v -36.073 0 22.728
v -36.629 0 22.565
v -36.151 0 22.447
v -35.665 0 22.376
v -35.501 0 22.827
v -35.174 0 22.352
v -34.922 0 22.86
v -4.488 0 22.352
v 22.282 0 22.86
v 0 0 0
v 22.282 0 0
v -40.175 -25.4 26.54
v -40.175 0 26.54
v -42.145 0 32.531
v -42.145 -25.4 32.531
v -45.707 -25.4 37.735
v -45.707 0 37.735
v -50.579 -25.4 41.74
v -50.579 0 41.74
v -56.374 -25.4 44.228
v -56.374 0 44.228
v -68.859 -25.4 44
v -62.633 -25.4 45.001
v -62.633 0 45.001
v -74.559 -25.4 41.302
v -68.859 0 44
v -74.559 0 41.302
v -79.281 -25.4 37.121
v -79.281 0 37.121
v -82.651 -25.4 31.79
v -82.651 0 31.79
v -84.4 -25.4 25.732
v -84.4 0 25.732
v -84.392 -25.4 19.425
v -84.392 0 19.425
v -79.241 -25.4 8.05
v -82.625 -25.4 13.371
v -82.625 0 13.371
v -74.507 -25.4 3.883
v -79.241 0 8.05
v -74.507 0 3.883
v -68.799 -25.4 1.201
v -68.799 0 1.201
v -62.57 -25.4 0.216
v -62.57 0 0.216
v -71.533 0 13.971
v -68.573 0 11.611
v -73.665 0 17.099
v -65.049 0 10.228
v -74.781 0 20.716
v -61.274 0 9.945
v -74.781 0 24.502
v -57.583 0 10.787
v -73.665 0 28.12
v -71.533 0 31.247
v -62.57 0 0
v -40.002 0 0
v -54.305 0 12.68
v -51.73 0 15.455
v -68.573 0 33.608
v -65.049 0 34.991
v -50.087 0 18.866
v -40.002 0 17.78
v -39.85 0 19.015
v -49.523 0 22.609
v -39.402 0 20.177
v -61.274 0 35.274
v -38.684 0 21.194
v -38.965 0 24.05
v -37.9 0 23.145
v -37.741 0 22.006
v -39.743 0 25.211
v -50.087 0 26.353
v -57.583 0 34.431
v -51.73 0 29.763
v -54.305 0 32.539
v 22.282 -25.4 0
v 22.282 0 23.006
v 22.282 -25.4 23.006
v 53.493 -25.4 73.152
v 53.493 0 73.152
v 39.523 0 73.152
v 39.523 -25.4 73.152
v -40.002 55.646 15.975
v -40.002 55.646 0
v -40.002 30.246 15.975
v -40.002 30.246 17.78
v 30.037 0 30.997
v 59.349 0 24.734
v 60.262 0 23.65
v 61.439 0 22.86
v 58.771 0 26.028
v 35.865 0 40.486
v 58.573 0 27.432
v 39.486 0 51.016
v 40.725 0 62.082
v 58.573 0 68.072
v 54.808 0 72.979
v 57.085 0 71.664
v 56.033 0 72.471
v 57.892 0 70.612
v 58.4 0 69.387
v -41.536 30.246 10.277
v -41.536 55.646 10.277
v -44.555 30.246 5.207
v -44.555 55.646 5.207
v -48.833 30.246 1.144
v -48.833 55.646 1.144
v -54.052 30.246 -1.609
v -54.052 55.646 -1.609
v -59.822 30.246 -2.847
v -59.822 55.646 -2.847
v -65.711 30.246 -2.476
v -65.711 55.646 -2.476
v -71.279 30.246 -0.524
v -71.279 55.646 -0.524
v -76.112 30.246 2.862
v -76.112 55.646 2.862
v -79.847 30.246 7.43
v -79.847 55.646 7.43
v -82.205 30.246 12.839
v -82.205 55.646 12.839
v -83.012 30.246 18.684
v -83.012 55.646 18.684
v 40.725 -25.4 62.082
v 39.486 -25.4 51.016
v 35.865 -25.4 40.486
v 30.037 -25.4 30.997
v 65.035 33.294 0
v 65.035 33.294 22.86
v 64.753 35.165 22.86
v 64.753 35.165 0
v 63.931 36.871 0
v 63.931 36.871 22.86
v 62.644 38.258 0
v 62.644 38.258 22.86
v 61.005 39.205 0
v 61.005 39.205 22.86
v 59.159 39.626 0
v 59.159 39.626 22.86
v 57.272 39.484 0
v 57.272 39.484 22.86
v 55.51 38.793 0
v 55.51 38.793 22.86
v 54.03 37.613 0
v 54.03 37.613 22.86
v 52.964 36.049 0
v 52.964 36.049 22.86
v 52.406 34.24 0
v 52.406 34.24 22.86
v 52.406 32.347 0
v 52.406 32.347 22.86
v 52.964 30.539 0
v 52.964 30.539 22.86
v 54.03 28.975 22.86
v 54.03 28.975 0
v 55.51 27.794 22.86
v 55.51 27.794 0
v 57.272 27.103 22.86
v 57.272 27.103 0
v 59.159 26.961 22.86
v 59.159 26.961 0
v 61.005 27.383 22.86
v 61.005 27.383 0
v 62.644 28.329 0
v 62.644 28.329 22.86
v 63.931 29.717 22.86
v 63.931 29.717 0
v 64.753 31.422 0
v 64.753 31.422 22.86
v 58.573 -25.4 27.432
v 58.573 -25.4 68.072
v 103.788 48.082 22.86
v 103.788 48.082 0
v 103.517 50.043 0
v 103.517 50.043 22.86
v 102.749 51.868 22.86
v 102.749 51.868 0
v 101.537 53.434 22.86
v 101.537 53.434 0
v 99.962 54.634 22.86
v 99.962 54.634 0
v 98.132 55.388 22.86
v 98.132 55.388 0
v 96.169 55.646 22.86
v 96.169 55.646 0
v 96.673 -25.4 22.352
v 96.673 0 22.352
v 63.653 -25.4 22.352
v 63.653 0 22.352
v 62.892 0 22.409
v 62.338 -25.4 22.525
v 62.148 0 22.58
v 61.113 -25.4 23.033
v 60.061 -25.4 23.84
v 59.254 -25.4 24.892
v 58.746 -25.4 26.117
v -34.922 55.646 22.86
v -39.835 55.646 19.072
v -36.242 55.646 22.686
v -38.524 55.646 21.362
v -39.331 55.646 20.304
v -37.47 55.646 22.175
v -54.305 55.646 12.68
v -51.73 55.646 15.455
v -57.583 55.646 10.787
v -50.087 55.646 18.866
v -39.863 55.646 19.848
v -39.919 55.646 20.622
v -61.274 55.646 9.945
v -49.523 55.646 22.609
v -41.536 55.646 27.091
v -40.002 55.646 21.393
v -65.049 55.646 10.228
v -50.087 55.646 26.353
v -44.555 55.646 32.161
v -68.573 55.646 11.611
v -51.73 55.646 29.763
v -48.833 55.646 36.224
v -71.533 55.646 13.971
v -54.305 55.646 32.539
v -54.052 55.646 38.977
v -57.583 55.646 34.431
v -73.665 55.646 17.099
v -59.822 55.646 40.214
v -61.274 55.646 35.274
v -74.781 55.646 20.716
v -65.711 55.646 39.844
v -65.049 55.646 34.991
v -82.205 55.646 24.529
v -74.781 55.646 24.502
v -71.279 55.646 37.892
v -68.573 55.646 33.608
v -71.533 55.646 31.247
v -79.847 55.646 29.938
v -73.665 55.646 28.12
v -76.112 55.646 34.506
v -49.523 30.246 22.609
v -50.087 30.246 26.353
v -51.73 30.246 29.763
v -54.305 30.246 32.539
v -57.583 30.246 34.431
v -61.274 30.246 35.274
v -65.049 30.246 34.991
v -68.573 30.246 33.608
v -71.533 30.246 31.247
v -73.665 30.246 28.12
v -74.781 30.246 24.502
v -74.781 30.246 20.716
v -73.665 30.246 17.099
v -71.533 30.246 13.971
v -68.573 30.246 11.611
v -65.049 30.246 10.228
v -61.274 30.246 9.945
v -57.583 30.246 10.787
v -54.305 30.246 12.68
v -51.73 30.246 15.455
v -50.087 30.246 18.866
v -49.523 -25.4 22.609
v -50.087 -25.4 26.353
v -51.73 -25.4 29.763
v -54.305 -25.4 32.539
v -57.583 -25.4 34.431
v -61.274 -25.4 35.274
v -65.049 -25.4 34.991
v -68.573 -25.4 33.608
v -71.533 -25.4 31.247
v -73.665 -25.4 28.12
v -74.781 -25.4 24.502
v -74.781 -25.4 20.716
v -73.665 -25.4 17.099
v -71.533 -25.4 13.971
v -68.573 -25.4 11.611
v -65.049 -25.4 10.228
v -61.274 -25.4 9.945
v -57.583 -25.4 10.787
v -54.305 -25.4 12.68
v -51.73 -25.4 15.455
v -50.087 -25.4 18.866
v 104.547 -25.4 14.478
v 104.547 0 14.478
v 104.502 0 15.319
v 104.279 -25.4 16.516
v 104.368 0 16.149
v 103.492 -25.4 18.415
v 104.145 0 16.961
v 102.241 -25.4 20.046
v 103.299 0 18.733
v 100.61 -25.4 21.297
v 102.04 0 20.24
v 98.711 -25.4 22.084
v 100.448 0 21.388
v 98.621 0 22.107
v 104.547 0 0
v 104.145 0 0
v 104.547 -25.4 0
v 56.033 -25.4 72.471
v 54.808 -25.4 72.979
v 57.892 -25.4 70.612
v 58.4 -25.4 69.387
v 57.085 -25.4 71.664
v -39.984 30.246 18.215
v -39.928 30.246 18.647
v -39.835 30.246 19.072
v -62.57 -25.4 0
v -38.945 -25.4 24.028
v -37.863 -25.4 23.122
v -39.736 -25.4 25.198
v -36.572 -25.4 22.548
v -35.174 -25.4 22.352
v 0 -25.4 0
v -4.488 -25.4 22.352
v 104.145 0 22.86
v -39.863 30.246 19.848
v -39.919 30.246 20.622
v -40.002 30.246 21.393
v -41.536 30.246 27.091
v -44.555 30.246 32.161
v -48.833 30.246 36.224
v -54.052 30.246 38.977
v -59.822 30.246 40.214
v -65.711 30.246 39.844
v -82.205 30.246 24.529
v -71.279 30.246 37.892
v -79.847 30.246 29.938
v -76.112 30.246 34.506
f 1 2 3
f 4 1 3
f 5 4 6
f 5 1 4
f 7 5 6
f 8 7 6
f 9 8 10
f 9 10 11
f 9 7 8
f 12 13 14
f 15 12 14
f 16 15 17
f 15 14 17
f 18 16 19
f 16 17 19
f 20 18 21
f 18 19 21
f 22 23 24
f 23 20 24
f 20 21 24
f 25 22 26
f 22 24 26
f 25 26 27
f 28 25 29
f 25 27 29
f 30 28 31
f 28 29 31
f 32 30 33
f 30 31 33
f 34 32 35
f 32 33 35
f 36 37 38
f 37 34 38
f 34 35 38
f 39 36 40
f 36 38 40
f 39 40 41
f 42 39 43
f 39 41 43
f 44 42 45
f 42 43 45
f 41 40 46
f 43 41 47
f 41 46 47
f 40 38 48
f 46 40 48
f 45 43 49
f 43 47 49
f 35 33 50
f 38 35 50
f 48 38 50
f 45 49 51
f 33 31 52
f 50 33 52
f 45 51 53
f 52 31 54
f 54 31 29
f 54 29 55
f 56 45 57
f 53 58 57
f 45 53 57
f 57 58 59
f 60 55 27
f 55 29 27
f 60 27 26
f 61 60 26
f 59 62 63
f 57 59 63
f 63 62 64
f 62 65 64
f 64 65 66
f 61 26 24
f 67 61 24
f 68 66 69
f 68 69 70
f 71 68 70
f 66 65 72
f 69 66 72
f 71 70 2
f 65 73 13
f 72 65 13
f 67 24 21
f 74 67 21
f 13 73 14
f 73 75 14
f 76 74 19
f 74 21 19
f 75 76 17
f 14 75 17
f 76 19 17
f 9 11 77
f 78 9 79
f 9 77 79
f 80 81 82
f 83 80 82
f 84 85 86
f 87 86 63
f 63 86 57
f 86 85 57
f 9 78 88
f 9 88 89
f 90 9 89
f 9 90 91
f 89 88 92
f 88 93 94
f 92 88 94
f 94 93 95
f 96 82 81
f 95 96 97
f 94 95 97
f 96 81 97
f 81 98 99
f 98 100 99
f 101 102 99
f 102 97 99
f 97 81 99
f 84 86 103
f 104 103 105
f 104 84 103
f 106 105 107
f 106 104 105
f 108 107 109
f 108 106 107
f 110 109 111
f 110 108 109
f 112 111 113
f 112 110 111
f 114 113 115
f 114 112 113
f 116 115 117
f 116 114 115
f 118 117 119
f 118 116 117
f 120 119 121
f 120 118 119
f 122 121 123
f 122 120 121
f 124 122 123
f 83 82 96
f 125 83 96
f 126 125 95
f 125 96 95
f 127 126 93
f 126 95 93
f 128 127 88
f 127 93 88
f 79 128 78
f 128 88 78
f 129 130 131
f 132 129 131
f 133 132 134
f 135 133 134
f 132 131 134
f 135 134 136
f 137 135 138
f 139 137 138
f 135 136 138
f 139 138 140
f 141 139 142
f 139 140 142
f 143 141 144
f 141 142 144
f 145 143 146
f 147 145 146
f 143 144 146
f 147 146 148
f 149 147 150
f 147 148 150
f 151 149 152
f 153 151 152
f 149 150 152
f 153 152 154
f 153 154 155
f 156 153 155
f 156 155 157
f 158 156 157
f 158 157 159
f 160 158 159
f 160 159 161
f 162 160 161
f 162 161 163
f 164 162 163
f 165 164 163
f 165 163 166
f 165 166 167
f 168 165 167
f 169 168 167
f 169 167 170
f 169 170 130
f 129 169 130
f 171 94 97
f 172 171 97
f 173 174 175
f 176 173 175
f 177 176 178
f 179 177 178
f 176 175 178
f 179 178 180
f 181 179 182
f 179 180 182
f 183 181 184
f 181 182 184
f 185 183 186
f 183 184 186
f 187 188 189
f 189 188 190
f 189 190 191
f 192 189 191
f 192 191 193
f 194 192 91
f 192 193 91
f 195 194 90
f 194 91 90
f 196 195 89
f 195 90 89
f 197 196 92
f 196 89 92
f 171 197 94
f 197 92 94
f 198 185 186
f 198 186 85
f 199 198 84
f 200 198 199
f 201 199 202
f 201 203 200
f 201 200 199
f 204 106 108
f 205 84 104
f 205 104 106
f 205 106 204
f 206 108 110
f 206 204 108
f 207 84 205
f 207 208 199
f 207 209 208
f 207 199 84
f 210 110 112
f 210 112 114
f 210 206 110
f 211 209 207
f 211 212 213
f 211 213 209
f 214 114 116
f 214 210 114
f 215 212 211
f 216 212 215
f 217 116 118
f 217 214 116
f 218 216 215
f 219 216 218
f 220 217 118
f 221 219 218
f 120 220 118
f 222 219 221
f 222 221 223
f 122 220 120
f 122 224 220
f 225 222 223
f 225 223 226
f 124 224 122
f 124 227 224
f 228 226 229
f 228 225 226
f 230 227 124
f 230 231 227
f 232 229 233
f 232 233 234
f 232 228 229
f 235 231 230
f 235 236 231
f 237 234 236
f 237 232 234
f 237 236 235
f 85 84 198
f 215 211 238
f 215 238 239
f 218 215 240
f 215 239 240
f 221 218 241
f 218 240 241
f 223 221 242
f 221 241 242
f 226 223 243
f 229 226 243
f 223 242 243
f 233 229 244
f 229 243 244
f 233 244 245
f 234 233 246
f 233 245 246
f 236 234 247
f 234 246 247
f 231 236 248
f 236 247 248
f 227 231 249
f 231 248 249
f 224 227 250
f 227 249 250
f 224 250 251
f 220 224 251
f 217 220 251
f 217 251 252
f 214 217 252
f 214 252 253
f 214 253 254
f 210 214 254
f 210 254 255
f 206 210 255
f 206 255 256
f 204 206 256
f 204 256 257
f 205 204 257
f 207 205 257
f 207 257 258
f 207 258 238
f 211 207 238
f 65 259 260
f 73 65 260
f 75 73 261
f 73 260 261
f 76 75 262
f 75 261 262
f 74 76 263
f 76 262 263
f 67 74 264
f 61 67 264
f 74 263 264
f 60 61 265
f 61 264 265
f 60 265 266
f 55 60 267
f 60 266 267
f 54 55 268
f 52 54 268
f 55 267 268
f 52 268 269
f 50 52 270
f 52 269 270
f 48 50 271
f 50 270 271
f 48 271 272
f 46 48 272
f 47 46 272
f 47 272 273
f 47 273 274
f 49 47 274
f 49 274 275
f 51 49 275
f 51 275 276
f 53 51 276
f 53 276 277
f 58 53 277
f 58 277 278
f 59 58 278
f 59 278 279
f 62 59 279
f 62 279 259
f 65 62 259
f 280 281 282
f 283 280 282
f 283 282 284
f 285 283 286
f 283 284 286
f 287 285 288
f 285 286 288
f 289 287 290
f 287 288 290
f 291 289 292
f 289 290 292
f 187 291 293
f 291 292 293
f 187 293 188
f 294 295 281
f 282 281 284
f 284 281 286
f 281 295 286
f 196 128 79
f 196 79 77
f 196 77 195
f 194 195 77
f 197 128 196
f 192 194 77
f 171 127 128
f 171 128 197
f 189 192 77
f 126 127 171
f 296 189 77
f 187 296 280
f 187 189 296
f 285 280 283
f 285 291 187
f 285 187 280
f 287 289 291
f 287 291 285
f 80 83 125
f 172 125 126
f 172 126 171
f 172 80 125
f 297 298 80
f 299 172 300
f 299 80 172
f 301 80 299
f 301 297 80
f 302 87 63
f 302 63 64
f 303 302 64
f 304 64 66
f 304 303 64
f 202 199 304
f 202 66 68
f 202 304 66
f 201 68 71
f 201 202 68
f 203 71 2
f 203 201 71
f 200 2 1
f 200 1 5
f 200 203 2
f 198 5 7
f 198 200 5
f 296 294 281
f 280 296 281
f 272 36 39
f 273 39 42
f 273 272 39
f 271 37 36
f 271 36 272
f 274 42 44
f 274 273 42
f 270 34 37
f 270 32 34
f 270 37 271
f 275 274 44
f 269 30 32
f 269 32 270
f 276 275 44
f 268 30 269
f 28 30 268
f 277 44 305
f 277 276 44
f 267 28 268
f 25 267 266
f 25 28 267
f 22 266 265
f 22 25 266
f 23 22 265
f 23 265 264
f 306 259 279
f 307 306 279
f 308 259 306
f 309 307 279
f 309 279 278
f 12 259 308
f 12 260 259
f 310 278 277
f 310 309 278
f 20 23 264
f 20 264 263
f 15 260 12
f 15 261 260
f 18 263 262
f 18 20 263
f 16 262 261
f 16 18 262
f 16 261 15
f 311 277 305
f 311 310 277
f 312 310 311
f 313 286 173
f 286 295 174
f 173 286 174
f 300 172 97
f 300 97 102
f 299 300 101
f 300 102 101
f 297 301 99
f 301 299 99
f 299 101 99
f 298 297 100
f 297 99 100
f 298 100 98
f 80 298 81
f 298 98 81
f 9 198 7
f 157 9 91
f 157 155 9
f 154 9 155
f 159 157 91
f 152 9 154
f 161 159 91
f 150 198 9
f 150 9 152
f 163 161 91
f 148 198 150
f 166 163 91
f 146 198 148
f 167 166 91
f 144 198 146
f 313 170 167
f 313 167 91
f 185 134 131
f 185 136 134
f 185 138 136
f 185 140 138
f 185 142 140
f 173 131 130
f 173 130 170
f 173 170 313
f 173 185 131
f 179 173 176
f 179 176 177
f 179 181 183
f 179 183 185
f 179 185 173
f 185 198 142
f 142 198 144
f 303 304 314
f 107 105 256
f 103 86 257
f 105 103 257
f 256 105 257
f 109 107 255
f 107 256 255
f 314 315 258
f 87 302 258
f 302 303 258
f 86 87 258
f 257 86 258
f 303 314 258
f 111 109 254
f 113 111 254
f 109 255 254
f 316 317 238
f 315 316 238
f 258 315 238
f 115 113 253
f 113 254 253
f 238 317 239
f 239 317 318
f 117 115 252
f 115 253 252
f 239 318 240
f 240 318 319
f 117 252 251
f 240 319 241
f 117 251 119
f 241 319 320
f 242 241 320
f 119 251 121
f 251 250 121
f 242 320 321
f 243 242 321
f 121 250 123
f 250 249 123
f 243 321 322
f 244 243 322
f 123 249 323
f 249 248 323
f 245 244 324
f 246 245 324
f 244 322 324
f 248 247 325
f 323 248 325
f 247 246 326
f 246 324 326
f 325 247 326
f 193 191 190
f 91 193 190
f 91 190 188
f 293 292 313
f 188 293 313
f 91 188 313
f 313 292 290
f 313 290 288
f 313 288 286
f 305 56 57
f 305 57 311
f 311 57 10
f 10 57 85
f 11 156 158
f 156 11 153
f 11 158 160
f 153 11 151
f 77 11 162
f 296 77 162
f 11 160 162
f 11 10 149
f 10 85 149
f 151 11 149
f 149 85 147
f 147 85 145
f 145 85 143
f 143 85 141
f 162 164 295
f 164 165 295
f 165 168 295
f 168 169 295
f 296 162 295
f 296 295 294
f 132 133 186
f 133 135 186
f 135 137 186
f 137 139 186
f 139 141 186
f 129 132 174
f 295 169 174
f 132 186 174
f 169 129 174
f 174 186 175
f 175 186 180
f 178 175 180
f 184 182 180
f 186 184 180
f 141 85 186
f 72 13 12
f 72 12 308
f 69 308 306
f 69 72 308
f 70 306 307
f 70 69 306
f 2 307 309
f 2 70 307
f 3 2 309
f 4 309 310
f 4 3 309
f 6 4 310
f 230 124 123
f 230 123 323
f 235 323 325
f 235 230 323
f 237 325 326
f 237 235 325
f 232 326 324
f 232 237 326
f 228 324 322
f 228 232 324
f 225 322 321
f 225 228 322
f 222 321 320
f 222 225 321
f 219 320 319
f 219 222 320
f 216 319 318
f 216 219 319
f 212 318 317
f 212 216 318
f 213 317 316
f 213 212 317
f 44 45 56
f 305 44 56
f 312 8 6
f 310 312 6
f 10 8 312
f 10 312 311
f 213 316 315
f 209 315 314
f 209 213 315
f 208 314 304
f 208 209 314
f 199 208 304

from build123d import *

# Parameters (mm, degrees)
F1_DEPTH      = 25.4
F2_R          = 22.395901736
F3_DEPTH      = 25.4
F5_DEPTH      = 22.86
F6_R          = 6.35
F7_DEPTH      = 22.861
F9_DEPTH      = 25.4
F10_T1_DEPTH  = 25.4
F10_T3_DEPTH  = 50.8
F11_R         = 21.59
F12_DEPTH     = 25.4
F13_T4_DEPTH  = 68.3456632912
F13_S5_R      = 21.59
F13_T6_DEPTH  = 36
F13_T11_DEPTH = 68.3456632912
F13_S12_R     = 21.59
F13_T13_DEPTH = 36
F13_T18_DEPTH = 68.3456632912
F13_S19_R     = 21.59
F13_T20_DEPTH = 36
F14_R         = 12.7
F15_DEPTH     = 81.0466632912


# Not quite as in the source:
# - a fillet or chamfer that OpenCascade refuses, or shapes differently, is made with other operations: its cross-section is extruded or revolved along the edge and cut away or added


with BuildPart() as f1:
    # F0 (on Front) → F1 (new body)
    with BuildSketch(Plane.XZ):
        with BuildLine():
            Line((-62.5702434896, 0), (104.5470208636, 0))
            Line((104.5470208636, 0), (104.5470208636, 14.478))
            ThreePointArc((104.5470208636, 14.478), (102.2407796587, 20.0457587951), (96.6730208636, 22.352))
            Line((96.6730208636, 22.352), (58.5730208636, 22.352))
            Line((58.5730208636, 22.352), (58.5730208636, 73.152))
            Line((58.5730208636, 73.152), (39.5230208636, 73.152))
            ThreePointArc((39.5230208636, 73.152), (37.7930667188, 45.1601637849), (21.4736518763, 22.352))
            Line((21.4736518763, 22.352), (-62.5702434896, 22.352))
            Line((-62.5702434896, 22.352), (-62.5702434896, 0))
        make_face()
    extrude(amount=F1_DEPTH)

    # F2 (on Front) → F3 (join)
    with BuildSketch(Plane.XZ):
        with Locations((-62.223136425, 22.609276697)):
            Circle(F2_R)
    extrude(amount=F3_DEPTH)

    # F4 (on Top) → F5 (join)
    with BuildSketch(Plane.XY):
        with BuildLine():
            Line((-40.0024205446, 55.6456632912), (-40.0024205446, 0))
            Line((-40.0024205446, 0), (104.1451707114, 0))
            Line((104.1451707114, 0), (103.7883380443, 48.0822120633))
            ThreePointArc((103.7883380443, 48.0822120633), (101.536671306, 53.4337730184), (96.1685478742, 55.6456632912))
            Line((96.1685478742, 55.6456632912), (-40.0024205446, 55.6456632912))
        make_face()
    extrude(amount=F5_DEPTH)

    # F6 (on face) → F7 (cut, through all)
    with BuildSketch(Plane.XY.offset(22.86)):
        with Locations((58.6848433214, 33.2936632912)):
            Circle(F6_R)
    extrude(amount=-F7_DEPTH, mode=Mode.SUBTRACT)

    # F8 (on face) → F9 (cut)
    with BuildSketch(Plane.XZ.offset(25.4)):
        with BuildLine():
            Line((22.2823120117, 0), (22.2823120117, 23.0063465614))
            ThreePointArc((22.2823120117, 23.0063465614), (21.8796568843, 22.6771033417), (21.4736518763, 22.352))
            Line((21.4736518763, 22.352), (-4.4883051887, 22.352))
            Line((-4.4883051887, 22.352), (0, 0))
            Line((0, 0), (22.2823120117, 0))
        make_face()
    extrude(amount=-F9_DEPTH, mode=Mode.SUBTRACT)

    # F10: fillet of radius 5.08 on 3 edges, made by hand

    # F10_s2 → F10_t1 (join)
    with BuildSketch(Plane.XZ):
        with BuildLine():
            ThreePointArc((63.6530208636, 22.352), (60.0609184152, 23.8398975516), (58.5730208636, 27.432))
            Line((58.5730208636, 27.432), (58.5730208636, 22.352))
            Line((58.5730208636, 22.352), (63.6530208636, 22.352))
        make_face()
        with BuildLine():
            ThreePointArc((-40.1749339209, 26.5403301063), (-38.4354512238, 23.537383006), (-35.1738015691, 22.352))
            Line((-35.1738015691, 22.352), (-39.8287124925, 22.352))
            ThreePointArc((-39.8287124925, 22.352), (-39.9033629402, 24.4543041094), (-40.1749339209, 26.5403301063))
        make_face()
    extrude(amount=F10_T1_DEPTH)

    # F10_s4 → F10_t3 (cut)
    with BuildSketch(Plane.XZ.offset(-12.7)):
        with BuildLine():
            ThreePointArc((58.5730208636, 68.072), (57.085123312, 71.6641024484), (53.4930208636, 73.152))
            Line((53.4930208636, 73.152), (58.5730208636, 73.152))
            Line((58.5730208636, 73.152), (58.5730208636, 68.072))
        make_face()
    extrude(amount=F10_T3_DEPTH, mode=Mode.SUBTRACT)

    # F11 (on face) → F12 (join)
    with BuildSketch(Plane(origin=(0, 55.6456632912, 0), x_dir=(-1, 0, 0), z_dir=(0, 1, 0))):
        with Locations((61.4217809885, 18.6838455159)):
            Circle(F11_R)
    extrude(amount=-F12_DEPTH)

    # F13: fillet of radius 5.08 on 1 edges, made by hand


with BuildPart() as f13_tool2:
    # F13_s3 → F13_t4 (new body)
    with BuildSketch(Plane.XZ.offset(-68.3456632912)):
        with BuildLine():
            ThreePointArc((-40.0024205446, 17.78), (-38.5145229931, 21.3721024484), (-34.9224205446, 22.86))
            Line((-34.9224205446, 22.86), (-40.0024205446, 22.86))
            Line((-40.0024205446, 22.86), (-40.0024205446, 17.78))
        make_face()
    extrude(amount=F13_T4_DEPTH)

    # F13_s5 → F13_t6 (cut, symmetric)
    with BuildSketch(Plane.XZ.offset(-34.2)):
        with Locations((-61.4217809885, 18.6838455159)):
            Circle(F13_S5_R)
    extrude(amount=F13_T6_DEPTH, both=True, mode=Mode.SUBTRACT)

    split(bisect_by=Plane.XZ.offset(-30.2456632912), keep=Keep.BOTTOM)


with BuildPart() as f1_1:
    add(f1.part)

    # F13_t1: cut F13_tool2
    add(f13_tool2.part, mode=Mode.SUBTRACT)


with BuildPart() as f13_tool9:
    # F13_s10 → F13_t11 (new body)
    with BuildSketch(Plane.XZ.offset(-68.3456632912)):
        with BuildLine():
            ThreePointArc((-40.0024205446, 17.78), (-38.5145229931, 21.3721024484), (-34.9224205446, 22.86))
            Line((-34.9224205446, 22.86), (-40.0024205446, 22.86))
            Line((-40.0024205446, 22.86), (-40.0024205446, 17.78))
        make_face()
    extrude(amount=F13_T11_DEPTH)

    # F13_s12 → F13_t13 (intersect, symmetric)
    with BuildSketch(Plane.XZ.offset(-34.2)):
        with Locations((-61.4217809885, 18.6838455159)):
            Circle(F13_S12_R)
    extrude(amount=F13_T13_DEPTH, both=True, mode=Mode.INTERSECT)

    split(bisect_by=Plane.XZ.offset(-30.2456632912), keep=Keep.TOP)


with BuildPart() as f1_2:
    add(f1_1.part)

    # F13_t8: cut F13_tool9
    add(f13_tool9.part, mode=Mode.SUBTRACT)


with BuildPart() as f13_tool16:
    # F13_s17 → F13_t18 (new body)
    with BuildSketch(Plane.XZ.offset(-68.3456632912)):
        with BuildLine():
            ThreePointArc((-40.0024205446, 17.78), (-38.5145229931, 21.3721024484), (-34.9224205446, 22.86))
            Line((-34.9224205446, 22.86), (-40.0024205446, 22.86))
            Line((-40.0024205446, 22.86), (-40.0024205446, 17.78))
        make_face()
    extrude(amount=F13_T18_DEPTH)

    # F13_s19 → F13_t20 (cut, symmetric)
    with BuildSketch(Plane.XZ.offset(-34.2)):
        with Locations((-61.4217809885, 18.6838455159)):
            Circle(F13_S19_R)
    extrude(amount=F13_T20_DEPTH, both=True, mode=Mode.SUBTRACT)

    split(bisect_by=Plane.XZ.offset(-30.2456632912), keep=Keep.TOP)


with BuildPart() as f1_3:
    add(f1_2.part)

    # F13_t15: cut F13_tool16
    add(f13_tool16.part, mode=Mode.SUBTRACT)

    # F14 (on face) → F15 (cut, through all)
    with BuildSketch(Plane.XZ.offset(25.4)):
        with Locations((-62.223136425, 22.609276697)):
            Circle(F14_R)
    extrude(amount=-F15_DEPTH, mode=Mode.SUBTRACT)


solid = f1_3.part
